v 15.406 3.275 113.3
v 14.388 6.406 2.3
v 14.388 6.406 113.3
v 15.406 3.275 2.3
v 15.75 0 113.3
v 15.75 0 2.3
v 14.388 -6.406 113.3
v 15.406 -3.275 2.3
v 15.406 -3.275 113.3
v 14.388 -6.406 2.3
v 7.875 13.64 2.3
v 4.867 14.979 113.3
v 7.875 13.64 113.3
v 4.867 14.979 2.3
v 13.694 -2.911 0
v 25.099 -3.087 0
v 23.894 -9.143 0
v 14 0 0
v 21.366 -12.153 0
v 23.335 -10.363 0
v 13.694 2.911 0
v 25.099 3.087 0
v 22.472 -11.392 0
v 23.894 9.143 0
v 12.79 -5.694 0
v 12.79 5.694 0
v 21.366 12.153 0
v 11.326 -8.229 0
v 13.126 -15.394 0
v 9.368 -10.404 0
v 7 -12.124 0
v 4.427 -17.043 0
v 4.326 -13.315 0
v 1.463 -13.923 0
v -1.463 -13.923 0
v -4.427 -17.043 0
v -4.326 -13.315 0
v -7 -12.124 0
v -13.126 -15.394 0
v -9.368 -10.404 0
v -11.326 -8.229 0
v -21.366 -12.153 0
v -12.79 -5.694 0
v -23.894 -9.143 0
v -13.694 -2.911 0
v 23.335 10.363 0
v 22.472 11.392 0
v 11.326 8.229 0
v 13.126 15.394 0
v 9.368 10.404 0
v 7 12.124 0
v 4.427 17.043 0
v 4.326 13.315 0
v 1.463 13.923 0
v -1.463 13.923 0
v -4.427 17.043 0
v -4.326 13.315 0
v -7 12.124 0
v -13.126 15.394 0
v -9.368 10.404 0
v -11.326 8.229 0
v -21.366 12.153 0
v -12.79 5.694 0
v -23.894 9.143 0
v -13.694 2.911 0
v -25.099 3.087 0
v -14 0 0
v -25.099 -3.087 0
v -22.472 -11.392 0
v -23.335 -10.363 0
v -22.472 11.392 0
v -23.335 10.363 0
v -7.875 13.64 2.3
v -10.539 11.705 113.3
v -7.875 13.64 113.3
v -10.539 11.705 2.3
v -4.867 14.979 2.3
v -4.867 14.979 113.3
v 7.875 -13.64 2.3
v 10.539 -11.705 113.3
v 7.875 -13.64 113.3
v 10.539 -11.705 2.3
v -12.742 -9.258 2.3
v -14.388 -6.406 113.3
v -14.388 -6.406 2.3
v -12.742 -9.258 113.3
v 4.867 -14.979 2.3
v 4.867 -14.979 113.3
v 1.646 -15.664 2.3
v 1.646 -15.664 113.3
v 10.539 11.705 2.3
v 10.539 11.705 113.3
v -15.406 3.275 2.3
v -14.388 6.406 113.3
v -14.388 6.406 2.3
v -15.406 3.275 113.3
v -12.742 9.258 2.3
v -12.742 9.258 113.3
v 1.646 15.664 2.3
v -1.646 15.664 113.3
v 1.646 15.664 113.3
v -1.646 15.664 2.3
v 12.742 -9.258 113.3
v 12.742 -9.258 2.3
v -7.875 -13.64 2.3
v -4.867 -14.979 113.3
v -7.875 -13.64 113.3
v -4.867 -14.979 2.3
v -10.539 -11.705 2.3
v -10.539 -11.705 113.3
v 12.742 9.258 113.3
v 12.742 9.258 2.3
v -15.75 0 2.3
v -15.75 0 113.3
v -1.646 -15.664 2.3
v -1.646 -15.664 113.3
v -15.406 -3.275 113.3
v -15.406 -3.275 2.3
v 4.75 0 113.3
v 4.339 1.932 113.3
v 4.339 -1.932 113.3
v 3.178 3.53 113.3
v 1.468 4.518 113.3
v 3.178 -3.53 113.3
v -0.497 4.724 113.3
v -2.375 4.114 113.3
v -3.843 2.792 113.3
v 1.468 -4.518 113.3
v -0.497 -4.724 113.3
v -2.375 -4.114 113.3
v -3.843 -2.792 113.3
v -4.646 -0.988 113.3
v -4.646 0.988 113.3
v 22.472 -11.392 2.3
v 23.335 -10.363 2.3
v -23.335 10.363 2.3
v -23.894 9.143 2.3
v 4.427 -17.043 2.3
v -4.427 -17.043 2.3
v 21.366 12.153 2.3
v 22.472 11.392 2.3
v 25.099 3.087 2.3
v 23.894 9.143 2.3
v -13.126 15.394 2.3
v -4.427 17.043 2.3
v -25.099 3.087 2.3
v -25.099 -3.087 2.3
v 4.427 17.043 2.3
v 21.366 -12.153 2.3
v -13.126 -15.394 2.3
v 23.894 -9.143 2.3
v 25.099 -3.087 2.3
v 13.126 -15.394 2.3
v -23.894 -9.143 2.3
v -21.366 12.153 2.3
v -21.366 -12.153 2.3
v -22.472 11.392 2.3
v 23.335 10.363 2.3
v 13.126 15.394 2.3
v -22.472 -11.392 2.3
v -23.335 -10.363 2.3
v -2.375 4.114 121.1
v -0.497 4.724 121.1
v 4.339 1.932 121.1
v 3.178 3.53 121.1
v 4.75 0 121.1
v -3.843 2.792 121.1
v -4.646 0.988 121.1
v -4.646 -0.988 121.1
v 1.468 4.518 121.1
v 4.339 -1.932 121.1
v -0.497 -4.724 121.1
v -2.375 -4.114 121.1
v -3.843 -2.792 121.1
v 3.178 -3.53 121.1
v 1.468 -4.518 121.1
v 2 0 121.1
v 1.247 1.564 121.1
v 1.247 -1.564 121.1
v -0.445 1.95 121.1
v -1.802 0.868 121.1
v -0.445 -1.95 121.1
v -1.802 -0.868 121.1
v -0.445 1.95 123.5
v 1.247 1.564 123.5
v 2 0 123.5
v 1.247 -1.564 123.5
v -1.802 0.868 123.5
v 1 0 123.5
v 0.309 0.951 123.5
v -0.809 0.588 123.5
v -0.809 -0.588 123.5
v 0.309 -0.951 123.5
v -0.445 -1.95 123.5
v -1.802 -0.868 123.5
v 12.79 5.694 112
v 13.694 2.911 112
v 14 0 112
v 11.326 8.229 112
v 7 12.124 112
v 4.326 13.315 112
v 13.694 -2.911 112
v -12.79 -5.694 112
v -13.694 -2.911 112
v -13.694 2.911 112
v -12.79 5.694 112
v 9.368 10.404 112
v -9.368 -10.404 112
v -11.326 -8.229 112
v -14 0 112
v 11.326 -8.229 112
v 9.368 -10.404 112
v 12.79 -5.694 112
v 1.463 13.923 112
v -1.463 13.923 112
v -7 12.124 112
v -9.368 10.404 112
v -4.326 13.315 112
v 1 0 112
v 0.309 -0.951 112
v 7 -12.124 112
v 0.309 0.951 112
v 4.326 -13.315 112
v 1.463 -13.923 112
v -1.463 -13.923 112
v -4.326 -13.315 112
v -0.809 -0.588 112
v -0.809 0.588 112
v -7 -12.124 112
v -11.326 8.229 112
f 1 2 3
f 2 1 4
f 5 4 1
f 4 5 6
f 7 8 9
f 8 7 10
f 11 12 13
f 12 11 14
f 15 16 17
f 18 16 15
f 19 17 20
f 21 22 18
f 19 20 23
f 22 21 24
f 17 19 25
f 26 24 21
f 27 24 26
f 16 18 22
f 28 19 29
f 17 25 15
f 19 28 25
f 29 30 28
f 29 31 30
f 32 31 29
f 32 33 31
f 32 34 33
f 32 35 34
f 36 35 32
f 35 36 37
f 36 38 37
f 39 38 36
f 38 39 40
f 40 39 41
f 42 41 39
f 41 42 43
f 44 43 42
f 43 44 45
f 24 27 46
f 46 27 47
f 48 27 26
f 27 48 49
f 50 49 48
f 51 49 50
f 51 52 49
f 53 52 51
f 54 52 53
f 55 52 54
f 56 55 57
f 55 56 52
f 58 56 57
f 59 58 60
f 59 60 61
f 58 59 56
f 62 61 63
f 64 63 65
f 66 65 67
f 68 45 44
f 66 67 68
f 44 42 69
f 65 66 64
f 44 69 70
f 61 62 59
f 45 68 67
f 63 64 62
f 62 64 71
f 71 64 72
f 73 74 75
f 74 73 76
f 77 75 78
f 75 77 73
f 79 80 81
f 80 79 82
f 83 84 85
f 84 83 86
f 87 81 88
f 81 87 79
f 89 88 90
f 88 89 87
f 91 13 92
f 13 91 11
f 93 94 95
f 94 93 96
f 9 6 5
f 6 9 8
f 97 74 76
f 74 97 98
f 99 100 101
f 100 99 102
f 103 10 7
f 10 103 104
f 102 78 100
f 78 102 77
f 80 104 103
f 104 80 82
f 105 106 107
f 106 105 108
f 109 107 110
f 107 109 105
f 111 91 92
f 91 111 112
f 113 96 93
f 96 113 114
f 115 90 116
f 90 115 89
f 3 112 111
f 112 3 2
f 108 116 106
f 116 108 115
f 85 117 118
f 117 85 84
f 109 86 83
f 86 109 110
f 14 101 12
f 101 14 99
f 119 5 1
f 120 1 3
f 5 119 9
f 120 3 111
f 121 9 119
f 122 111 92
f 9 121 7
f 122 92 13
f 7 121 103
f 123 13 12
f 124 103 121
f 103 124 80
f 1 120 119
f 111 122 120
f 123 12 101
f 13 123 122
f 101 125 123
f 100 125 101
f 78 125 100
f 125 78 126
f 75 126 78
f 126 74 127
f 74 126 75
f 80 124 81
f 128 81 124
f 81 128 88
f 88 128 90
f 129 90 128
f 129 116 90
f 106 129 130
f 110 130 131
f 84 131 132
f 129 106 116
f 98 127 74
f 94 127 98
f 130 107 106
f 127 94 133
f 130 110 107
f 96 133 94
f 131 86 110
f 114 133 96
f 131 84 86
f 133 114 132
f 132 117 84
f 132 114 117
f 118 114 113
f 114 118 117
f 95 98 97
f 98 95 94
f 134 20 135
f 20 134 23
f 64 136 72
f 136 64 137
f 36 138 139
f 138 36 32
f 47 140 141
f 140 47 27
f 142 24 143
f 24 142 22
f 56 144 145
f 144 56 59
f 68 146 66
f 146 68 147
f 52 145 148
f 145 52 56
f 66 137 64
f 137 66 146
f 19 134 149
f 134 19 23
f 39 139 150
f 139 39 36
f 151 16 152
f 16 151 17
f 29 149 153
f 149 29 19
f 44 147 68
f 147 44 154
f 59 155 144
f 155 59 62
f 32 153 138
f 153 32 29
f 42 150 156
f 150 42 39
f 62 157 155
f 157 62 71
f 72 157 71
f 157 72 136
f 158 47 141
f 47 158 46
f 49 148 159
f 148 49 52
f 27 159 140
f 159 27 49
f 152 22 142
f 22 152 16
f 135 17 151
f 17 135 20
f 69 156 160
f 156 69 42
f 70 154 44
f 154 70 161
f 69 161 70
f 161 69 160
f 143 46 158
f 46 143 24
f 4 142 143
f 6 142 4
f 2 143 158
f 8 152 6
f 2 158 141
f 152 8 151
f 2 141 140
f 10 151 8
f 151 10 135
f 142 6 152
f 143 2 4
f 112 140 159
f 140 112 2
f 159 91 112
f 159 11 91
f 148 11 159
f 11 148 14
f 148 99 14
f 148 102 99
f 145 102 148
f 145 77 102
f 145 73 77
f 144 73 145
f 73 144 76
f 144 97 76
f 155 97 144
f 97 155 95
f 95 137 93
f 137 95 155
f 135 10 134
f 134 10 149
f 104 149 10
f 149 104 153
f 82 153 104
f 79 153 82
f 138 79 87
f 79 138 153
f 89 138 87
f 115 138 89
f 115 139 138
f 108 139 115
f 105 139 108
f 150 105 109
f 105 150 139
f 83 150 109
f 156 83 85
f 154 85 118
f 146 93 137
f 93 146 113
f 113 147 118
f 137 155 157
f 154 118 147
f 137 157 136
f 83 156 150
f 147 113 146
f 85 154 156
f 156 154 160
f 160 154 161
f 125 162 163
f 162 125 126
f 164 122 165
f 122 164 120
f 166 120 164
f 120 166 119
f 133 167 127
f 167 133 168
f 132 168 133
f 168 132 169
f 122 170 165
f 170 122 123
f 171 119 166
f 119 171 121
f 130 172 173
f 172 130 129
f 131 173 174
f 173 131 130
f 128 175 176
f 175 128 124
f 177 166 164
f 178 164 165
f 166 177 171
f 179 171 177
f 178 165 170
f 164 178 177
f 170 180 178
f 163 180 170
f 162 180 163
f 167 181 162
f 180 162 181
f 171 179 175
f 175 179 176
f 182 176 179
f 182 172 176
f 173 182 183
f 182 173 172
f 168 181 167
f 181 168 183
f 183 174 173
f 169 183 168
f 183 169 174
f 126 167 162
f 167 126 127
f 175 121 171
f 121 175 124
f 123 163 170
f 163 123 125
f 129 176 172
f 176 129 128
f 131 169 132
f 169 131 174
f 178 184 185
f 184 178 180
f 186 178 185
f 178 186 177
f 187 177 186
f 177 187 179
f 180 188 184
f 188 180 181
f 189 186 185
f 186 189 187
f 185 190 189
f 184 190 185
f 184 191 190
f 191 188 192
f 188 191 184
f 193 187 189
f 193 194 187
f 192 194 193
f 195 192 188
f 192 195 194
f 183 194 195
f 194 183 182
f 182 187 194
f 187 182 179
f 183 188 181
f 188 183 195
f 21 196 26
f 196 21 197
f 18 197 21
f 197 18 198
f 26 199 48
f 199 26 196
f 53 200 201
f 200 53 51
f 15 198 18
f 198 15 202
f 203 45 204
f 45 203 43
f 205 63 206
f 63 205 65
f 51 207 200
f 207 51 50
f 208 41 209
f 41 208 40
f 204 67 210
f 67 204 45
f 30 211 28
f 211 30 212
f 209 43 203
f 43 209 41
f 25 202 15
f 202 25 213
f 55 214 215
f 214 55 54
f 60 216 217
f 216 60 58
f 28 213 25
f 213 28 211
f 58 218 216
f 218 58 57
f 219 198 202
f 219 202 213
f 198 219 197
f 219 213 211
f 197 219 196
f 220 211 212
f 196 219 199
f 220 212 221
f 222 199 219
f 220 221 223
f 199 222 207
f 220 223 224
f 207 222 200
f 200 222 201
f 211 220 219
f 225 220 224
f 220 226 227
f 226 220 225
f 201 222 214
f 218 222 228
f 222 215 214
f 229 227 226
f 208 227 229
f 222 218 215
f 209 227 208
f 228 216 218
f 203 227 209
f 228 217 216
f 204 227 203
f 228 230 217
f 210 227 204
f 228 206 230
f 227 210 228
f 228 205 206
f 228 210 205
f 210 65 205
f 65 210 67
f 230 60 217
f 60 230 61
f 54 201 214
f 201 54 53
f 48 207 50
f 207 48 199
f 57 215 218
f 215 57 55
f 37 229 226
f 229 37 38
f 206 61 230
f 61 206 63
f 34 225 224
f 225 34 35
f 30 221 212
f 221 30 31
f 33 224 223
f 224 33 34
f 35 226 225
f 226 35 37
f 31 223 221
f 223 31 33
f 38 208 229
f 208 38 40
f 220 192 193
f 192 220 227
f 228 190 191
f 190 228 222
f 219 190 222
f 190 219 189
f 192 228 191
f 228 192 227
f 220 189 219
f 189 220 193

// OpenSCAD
woodThickness = 4.5;

sideDistanceX = 42.93;
sideDistanceZ = 69.93;

//frostruder();
syringe();
//plunger();

module syringe()
{
	difference()
	{
		union()
		{
			cylinder(h=113.3, r=15.75, convexity=10);
			dxf_linear_extrude(
				file = "clamp.dxf",
				layer = "Syringe Flange",
				height = 2.3,
				convexity = 10
			);
			translate([0,0,113.2]) cylinder(h=7.9, r=9.5/2);
			translate([0,0,113.2+7.8]) cylinder(h=2.5, r=2);
		}
		cylinder(h=112, r=14, convexity=10);
		translate([0,0,112]) cylinder(h=20, r=1);
	}
}

module plunger()
{
	union()
	{
		cylinder(h=2.5, r=33.88/2);
		translate([-1,-27.5/2, 0]) cube([2,27.5,124.5]);
		translate([-27.5/2, -1, 0]) cube([27.5,2,124.5]);
		translate([0,0,124.5])
		{
			cylinder(h=1.6, r=27.5/2);
			translate([0,0,1.6])
			{
				translate([-16.8/2, -1, 0]) cube([16.8, 2, 4.9]);
				translate([-1,-16.8/2, 0]) cube([2, 16.8, 4.9]);
				translate([0,0,4.9])
				{
					cylinder(h=2, r=22.8/2);
					translate([0,0,2]) intersection()
					{
						cylinder(h=4.5, r1=22.8/2, r2=1);
						union()
						{
							translate([-22.8/2, -1, 0])cube([22.8, 2, 4.5]);
							translate([-1,-22.8/2, 0]) cube([2, 22.8, 4.5]);
						}
					}
				}
			}
		}
	}
}

module frostruder()
{
	rotate([90, 0, 0])
	{
		backPanel();
		leftPanel();
		rightPanel();
	
		syringeTop();
		syringeBottom();
	
		topMount();
		bottomMount();
	}

	render()
	{
		translate([0,30,50]) rotate([180, 0, 0]) syringe();
	}
}

module backPanel()
{
	woodPanel("Back Panel");
}

module leftPanel()
{
	translate([sideDistanceX, 0, sideDistanceZ]) rotate([0, 90,0]) woodPanel("Left Panel");
}

module rightPanel()
{
	translate([-sideDistanceX, 0, sideDistanceZ]) rotate([0, -90,0]) woodPanel("Right Panel");
}

module syringeTop()
{
	translate([0,41,170]) rotate([-90,0,0]) woodPanel("Syringe Top");
}

module syringeBottom()
{
	translate([0,-59,80]) rotate([-90,0,0]) woodPanel("Syringe Bottom");
}

module bottomMount()
{
	translate([0,-(75+woodThickness*2),-155]) rotate([-90,0,0]) woodPanel("Bottom Mount");
}

module topMount()
{
	translate([0,-(75+woodThickness),-245]) rotate([-90,0,0]) woodPanel("Top Mount");
}

module woodPanel(layer, thickness=woodThickness)
{
	dxf_linear_extrude(
		file = "frostruder.dxf",
		layer = layer,
		height = thickness,
		convexity = 10
	);
}
